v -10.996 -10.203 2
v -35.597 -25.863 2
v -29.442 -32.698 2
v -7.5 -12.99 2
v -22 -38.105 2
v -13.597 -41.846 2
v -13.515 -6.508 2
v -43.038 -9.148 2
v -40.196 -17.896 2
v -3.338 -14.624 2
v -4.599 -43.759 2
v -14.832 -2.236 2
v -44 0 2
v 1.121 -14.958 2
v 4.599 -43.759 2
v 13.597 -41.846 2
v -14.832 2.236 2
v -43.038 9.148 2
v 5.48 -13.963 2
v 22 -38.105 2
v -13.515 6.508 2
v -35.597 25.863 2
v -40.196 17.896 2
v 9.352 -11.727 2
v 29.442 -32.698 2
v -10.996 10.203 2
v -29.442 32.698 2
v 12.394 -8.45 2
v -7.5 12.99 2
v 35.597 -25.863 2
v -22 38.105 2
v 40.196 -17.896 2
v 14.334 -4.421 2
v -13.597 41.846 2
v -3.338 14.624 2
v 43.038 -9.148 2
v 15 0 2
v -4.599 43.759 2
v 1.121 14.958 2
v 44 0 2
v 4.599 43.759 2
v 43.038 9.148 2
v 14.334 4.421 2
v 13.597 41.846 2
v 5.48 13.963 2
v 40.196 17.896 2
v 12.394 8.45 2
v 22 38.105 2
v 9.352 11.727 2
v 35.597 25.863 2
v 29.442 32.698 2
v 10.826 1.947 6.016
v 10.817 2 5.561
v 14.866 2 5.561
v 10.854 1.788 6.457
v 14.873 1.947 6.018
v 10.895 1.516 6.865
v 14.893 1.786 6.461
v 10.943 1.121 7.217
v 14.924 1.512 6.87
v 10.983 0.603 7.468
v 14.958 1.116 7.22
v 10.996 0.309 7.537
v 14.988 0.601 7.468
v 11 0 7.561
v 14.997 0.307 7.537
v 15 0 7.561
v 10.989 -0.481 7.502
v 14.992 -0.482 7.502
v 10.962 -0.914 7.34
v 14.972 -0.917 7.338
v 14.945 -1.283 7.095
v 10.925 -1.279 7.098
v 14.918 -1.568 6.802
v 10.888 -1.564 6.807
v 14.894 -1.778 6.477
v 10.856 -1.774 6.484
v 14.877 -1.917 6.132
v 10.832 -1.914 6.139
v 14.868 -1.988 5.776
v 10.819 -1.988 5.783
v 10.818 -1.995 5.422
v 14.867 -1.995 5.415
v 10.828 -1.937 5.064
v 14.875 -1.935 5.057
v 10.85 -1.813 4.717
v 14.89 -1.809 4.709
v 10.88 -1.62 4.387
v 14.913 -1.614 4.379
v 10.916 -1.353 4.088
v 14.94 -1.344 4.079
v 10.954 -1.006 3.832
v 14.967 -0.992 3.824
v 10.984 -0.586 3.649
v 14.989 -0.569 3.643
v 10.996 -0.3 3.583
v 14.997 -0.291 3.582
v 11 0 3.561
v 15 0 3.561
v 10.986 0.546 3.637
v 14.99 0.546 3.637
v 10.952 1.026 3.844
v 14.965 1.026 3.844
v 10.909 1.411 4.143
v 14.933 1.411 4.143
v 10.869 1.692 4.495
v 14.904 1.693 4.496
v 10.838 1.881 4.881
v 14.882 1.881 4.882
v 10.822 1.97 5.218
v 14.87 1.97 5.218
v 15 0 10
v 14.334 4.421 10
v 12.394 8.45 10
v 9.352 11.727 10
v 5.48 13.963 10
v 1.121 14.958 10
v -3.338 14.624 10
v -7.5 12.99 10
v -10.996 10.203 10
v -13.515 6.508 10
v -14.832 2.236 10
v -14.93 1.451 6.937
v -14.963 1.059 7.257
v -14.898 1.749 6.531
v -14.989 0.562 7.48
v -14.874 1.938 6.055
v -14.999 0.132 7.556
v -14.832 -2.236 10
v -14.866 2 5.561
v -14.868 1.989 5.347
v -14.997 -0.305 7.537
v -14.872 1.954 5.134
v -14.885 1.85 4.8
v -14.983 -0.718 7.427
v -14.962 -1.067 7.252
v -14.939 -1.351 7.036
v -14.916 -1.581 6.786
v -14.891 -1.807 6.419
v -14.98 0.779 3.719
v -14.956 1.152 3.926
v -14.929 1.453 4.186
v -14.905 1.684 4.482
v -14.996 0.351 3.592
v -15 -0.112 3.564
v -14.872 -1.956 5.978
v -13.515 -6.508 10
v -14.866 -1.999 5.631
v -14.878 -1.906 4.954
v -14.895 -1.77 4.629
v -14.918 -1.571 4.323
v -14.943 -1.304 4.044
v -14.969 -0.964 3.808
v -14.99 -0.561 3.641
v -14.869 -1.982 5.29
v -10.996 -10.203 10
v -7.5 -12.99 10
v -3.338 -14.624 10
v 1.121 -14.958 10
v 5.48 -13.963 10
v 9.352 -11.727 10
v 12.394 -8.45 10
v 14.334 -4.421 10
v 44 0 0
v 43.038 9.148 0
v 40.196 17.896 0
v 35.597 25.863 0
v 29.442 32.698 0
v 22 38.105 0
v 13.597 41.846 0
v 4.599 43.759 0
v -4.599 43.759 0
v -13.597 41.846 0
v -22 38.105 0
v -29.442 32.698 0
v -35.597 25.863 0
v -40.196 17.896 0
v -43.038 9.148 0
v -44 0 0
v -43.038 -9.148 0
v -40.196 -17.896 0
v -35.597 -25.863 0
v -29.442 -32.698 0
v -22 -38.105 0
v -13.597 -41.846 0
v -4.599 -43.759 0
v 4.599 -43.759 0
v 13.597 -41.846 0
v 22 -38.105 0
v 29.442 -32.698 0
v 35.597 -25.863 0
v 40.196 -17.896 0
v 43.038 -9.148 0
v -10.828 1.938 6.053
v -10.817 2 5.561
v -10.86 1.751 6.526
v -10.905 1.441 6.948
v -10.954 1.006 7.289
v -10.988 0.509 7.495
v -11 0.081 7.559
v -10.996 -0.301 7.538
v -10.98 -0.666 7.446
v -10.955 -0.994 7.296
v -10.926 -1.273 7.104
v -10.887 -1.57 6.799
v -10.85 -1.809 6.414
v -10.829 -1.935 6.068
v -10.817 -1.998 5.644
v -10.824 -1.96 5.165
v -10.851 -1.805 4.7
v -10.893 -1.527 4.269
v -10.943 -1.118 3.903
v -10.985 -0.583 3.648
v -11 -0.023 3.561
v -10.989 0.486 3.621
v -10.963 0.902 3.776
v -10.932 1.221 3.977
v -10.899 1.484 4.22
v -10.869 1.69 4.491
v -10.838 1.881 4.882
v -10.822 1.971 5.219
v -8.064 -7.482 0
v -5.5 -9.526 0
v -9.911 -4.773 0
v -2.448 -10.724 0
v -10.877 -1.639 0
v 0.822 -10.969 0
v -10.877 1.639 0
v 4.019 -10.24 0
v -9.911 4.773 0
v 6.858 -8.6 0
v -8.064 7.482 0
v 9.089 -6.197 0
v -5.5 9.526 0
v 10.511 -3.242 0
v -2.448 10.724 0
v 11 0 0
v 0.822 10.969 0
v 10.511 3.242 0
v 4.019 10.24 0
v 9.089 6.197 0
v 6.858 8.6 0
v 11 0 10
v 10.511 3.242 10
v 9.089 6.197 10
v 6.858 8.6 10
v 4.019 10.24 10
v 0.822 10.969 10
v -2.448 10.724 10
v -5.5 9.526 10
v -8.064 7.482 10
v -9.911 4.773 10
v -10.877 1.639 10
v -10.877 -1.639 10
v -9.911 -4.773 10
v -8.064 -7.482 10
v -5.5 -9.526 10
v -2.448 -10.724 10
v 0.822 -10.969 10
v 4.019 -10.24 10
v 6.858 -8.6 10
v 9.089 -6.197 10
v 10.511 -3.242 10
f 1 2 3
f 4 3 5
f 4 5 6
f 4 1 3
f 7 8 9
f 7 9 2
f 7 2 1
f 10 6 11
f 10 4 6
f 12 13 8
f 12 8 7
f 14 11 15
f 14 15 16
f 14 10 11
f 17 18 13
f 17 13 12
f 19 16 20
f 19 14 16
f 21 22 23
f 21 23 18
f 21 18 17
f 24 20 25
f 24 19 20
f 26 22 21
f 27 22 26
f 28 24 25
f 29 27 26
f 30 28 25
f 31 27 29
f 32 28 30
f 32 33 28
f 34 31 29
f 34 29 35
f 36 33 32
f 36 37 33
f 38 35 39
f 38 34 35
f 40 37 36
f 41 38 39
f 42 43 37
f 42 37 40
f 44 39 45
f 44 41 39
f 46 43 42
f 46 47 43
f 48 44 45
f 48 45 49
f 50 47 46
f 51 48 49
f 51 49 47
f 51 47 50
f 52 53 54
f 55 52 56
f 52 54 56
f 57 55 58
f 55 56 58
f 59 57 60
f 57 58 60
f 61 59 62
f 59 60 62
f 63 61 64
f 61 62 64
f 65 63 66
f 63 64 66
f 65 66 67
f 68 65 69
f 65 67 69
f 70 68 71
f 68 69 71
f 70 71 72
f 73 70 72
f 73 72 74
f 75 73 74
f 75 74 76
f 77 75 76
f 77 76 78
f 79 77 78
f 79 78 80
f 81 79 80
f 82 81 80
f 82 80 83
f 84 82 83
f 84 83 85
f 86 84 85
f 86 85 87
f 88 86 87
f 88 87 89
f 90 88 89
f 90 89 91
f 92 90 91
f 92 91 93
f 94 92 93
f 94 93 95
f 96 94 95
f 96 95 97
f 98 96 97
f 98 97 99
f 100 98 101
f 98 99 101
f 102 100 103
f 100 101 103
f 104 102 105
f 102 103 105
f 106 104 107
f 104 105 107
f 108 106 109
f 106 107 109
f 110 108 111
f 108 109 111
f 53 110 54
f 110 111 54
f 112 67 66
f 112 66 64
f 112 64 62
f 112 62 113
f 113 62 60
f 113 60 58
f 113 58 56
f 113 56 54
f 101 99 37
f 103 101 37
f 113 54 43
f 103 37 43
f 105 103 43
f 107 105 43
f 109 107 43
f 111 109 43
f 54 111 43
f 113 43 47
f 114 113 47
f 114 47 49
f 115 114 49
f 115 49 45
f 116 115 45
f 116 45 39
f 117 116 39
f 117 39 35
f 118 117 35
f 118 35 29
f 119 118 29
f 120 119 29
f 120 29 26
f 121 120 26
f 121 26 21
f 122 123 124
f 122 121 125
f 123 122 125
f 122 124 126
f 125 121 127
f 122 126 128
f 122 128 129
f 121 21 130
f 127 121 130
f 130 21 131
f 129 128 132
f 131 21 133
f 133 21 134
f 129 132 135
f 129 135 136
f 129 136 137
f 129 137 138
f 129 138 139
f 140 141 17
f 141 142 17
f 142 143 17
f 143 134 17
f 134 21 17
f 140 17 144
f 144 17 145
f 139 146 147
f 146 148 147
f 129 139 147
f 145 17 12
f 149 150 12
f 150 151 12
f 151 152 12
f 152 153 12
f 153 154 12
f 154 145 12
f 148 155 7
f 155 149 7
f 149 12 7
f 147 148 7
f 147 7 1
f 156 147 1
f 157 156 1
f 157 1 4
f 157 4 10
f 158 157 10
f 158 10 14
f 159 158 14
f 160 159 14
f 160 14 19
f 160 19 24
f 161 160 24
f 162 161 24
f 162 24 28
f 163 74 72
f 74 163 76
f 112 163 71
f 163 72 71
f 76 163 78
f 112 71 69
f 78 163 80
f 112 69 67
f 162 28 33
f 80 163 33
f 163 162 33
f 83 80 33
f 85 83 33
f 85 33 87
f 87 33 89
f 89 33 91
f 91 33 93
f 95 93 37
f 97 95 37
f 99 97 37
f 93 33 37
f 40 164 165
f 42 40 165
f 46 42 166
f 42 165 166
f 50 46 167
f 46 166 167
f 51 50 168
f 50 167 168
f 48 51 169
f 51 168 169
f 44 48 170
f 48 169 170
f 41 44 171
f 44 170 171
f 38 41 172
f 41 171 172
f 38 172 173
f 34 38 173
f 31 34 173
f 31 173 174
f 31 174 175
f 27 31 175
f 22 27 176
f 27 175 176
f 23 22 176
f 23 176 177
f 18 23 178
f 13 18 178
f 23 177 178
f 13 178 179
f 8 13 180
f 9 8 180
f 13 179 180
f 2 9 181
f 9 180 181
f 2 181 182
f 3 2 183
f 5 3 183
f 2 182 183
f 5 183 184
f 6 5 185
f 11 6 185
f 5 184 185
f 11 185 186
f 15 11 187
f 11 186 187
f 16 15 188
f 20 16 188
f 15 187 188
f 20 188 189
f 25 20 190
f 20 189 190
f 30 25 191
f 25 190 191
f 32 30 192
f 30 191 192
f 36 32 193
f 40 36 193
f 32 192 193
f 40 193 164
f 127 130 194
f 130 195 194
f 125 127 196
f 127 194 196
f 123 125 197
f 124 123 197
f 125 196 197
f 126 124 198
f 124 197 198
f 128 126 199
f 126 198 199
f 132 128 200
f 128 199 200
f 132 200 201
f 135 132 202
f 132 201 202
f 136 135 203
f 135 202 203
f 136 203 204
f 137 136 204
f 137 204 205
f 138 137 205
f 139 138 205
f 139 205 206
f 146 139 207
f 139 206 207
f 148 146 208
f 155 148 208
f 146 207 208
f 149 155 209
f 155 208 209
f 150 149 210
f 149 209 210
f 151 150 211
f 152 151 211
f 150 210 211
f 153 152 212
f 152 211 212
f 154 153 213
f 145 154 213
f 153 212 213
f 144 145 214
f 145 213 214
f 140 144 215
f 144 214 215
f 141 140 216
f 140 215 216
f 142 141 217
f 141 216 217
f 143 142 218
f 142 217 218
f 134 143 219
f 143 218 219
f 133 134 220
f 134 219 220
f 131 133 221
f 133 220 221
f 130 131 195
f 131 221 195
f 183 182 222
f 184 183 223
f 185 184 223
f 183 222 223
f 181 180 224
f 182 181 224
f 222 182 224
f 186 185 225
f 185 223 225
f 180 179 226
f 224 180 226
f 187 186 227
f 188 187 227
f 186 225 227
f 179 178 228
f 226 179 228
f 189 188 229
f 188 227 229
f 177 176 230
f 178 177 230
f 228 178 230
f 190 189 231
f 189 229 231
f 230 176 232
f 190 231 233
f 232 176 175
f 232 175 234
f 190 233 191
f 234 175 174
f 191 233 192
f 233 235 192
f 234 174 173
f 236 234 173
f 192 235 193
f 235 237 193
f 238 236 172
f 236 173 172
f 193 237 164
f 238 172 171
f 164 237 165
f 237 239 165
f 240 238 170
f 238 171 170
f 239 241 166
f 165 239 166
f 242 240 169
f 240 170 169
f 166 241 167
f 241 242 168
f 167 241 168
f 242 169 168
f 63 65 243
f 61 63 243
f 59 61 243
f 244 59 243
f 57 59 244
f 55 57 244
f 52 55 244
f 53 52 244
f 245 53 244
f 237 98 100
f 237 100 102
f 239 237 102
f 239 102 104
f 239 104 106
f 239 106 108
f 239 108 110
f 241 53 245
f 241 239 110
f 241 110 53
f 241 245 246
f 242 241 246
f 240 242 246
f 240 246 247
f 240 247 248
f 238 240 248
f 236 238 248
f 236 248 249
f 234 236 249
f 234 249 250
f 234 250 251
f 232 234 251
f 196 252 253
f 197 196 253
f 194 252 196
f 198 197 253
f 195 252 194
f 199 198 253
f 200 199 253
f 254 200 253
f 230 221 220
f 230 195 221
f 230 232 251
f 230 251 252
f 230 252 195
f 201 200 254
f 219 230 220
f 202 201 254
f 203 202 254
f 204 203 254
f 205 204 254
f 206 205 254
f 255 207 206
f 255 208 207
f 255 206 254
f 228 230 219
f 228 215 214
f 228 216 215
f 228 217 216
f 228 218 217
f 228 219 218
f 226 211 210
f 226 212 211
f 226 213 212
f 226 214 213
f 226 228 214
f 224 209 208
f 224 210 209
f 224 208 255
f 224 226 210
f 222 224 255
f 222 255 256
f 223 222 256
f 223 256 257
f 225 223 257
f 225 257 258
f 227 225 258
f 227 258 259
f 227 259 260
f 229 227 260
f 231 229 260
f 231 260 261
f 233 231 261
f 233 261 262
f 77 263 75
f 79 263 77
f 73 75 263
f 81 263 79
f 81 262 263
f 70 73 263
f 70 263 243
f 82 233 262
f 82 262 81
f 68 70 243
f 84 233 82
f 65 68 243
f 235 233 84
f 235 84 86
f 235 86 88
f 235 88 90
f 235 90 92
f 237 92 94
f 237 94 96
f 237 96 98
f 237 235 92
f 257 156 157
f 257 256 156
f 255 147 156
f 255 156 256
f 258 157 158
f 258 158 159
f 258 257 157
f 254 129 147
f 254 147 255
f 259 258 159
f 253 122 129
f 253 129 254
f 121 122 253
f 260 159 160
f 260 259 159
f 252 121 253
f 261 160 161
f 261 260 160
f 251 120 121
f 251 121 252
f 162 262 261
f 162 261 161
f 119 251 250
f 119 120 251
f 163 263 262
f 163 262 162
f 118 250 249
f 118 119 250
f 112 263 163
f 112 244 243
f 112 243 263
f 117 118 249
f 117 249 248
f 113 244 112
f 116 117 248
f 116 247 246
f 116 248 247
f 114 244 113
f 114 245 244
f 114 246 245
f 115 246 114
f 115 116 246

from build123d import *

# Parameters (mm, degrees)
F0_R     = 15
F0_R_2   = 11
F1_DEPTH = 10
F0_R_3   = 44
F2_DEPTH = 2
F3_R     = 2
F4_DEPTH = 25


with BuildPart() as f1:
    # F0 (on Top) → F1 (new body)
    with BuildSketch(Plane.XY):
        Circle(F0_R)
        Circle(F0_R_2, mode=Mode.SUBTRACT)
    extrude(amount=F1_DEPTH)

    # F0 (on Top) → F2 (join)
    with BuildSketch(Plane.XY):
        Circle(F0_R_3)
        Circle(F0_R, mode=Mode.SUBTRACT)
    extrude(amount=F2_DEPTH)

    # F3 (on Right) → F4 (cut, symmetric)
    with BuildSketch(Plane.YZ):
        with Locations((0, 5.560728)):
            Circle(F3_R)
    extrude(amount=F4_DEPTH, both=True, mode=Mode.SUBTRACT)


solid = f1.part
